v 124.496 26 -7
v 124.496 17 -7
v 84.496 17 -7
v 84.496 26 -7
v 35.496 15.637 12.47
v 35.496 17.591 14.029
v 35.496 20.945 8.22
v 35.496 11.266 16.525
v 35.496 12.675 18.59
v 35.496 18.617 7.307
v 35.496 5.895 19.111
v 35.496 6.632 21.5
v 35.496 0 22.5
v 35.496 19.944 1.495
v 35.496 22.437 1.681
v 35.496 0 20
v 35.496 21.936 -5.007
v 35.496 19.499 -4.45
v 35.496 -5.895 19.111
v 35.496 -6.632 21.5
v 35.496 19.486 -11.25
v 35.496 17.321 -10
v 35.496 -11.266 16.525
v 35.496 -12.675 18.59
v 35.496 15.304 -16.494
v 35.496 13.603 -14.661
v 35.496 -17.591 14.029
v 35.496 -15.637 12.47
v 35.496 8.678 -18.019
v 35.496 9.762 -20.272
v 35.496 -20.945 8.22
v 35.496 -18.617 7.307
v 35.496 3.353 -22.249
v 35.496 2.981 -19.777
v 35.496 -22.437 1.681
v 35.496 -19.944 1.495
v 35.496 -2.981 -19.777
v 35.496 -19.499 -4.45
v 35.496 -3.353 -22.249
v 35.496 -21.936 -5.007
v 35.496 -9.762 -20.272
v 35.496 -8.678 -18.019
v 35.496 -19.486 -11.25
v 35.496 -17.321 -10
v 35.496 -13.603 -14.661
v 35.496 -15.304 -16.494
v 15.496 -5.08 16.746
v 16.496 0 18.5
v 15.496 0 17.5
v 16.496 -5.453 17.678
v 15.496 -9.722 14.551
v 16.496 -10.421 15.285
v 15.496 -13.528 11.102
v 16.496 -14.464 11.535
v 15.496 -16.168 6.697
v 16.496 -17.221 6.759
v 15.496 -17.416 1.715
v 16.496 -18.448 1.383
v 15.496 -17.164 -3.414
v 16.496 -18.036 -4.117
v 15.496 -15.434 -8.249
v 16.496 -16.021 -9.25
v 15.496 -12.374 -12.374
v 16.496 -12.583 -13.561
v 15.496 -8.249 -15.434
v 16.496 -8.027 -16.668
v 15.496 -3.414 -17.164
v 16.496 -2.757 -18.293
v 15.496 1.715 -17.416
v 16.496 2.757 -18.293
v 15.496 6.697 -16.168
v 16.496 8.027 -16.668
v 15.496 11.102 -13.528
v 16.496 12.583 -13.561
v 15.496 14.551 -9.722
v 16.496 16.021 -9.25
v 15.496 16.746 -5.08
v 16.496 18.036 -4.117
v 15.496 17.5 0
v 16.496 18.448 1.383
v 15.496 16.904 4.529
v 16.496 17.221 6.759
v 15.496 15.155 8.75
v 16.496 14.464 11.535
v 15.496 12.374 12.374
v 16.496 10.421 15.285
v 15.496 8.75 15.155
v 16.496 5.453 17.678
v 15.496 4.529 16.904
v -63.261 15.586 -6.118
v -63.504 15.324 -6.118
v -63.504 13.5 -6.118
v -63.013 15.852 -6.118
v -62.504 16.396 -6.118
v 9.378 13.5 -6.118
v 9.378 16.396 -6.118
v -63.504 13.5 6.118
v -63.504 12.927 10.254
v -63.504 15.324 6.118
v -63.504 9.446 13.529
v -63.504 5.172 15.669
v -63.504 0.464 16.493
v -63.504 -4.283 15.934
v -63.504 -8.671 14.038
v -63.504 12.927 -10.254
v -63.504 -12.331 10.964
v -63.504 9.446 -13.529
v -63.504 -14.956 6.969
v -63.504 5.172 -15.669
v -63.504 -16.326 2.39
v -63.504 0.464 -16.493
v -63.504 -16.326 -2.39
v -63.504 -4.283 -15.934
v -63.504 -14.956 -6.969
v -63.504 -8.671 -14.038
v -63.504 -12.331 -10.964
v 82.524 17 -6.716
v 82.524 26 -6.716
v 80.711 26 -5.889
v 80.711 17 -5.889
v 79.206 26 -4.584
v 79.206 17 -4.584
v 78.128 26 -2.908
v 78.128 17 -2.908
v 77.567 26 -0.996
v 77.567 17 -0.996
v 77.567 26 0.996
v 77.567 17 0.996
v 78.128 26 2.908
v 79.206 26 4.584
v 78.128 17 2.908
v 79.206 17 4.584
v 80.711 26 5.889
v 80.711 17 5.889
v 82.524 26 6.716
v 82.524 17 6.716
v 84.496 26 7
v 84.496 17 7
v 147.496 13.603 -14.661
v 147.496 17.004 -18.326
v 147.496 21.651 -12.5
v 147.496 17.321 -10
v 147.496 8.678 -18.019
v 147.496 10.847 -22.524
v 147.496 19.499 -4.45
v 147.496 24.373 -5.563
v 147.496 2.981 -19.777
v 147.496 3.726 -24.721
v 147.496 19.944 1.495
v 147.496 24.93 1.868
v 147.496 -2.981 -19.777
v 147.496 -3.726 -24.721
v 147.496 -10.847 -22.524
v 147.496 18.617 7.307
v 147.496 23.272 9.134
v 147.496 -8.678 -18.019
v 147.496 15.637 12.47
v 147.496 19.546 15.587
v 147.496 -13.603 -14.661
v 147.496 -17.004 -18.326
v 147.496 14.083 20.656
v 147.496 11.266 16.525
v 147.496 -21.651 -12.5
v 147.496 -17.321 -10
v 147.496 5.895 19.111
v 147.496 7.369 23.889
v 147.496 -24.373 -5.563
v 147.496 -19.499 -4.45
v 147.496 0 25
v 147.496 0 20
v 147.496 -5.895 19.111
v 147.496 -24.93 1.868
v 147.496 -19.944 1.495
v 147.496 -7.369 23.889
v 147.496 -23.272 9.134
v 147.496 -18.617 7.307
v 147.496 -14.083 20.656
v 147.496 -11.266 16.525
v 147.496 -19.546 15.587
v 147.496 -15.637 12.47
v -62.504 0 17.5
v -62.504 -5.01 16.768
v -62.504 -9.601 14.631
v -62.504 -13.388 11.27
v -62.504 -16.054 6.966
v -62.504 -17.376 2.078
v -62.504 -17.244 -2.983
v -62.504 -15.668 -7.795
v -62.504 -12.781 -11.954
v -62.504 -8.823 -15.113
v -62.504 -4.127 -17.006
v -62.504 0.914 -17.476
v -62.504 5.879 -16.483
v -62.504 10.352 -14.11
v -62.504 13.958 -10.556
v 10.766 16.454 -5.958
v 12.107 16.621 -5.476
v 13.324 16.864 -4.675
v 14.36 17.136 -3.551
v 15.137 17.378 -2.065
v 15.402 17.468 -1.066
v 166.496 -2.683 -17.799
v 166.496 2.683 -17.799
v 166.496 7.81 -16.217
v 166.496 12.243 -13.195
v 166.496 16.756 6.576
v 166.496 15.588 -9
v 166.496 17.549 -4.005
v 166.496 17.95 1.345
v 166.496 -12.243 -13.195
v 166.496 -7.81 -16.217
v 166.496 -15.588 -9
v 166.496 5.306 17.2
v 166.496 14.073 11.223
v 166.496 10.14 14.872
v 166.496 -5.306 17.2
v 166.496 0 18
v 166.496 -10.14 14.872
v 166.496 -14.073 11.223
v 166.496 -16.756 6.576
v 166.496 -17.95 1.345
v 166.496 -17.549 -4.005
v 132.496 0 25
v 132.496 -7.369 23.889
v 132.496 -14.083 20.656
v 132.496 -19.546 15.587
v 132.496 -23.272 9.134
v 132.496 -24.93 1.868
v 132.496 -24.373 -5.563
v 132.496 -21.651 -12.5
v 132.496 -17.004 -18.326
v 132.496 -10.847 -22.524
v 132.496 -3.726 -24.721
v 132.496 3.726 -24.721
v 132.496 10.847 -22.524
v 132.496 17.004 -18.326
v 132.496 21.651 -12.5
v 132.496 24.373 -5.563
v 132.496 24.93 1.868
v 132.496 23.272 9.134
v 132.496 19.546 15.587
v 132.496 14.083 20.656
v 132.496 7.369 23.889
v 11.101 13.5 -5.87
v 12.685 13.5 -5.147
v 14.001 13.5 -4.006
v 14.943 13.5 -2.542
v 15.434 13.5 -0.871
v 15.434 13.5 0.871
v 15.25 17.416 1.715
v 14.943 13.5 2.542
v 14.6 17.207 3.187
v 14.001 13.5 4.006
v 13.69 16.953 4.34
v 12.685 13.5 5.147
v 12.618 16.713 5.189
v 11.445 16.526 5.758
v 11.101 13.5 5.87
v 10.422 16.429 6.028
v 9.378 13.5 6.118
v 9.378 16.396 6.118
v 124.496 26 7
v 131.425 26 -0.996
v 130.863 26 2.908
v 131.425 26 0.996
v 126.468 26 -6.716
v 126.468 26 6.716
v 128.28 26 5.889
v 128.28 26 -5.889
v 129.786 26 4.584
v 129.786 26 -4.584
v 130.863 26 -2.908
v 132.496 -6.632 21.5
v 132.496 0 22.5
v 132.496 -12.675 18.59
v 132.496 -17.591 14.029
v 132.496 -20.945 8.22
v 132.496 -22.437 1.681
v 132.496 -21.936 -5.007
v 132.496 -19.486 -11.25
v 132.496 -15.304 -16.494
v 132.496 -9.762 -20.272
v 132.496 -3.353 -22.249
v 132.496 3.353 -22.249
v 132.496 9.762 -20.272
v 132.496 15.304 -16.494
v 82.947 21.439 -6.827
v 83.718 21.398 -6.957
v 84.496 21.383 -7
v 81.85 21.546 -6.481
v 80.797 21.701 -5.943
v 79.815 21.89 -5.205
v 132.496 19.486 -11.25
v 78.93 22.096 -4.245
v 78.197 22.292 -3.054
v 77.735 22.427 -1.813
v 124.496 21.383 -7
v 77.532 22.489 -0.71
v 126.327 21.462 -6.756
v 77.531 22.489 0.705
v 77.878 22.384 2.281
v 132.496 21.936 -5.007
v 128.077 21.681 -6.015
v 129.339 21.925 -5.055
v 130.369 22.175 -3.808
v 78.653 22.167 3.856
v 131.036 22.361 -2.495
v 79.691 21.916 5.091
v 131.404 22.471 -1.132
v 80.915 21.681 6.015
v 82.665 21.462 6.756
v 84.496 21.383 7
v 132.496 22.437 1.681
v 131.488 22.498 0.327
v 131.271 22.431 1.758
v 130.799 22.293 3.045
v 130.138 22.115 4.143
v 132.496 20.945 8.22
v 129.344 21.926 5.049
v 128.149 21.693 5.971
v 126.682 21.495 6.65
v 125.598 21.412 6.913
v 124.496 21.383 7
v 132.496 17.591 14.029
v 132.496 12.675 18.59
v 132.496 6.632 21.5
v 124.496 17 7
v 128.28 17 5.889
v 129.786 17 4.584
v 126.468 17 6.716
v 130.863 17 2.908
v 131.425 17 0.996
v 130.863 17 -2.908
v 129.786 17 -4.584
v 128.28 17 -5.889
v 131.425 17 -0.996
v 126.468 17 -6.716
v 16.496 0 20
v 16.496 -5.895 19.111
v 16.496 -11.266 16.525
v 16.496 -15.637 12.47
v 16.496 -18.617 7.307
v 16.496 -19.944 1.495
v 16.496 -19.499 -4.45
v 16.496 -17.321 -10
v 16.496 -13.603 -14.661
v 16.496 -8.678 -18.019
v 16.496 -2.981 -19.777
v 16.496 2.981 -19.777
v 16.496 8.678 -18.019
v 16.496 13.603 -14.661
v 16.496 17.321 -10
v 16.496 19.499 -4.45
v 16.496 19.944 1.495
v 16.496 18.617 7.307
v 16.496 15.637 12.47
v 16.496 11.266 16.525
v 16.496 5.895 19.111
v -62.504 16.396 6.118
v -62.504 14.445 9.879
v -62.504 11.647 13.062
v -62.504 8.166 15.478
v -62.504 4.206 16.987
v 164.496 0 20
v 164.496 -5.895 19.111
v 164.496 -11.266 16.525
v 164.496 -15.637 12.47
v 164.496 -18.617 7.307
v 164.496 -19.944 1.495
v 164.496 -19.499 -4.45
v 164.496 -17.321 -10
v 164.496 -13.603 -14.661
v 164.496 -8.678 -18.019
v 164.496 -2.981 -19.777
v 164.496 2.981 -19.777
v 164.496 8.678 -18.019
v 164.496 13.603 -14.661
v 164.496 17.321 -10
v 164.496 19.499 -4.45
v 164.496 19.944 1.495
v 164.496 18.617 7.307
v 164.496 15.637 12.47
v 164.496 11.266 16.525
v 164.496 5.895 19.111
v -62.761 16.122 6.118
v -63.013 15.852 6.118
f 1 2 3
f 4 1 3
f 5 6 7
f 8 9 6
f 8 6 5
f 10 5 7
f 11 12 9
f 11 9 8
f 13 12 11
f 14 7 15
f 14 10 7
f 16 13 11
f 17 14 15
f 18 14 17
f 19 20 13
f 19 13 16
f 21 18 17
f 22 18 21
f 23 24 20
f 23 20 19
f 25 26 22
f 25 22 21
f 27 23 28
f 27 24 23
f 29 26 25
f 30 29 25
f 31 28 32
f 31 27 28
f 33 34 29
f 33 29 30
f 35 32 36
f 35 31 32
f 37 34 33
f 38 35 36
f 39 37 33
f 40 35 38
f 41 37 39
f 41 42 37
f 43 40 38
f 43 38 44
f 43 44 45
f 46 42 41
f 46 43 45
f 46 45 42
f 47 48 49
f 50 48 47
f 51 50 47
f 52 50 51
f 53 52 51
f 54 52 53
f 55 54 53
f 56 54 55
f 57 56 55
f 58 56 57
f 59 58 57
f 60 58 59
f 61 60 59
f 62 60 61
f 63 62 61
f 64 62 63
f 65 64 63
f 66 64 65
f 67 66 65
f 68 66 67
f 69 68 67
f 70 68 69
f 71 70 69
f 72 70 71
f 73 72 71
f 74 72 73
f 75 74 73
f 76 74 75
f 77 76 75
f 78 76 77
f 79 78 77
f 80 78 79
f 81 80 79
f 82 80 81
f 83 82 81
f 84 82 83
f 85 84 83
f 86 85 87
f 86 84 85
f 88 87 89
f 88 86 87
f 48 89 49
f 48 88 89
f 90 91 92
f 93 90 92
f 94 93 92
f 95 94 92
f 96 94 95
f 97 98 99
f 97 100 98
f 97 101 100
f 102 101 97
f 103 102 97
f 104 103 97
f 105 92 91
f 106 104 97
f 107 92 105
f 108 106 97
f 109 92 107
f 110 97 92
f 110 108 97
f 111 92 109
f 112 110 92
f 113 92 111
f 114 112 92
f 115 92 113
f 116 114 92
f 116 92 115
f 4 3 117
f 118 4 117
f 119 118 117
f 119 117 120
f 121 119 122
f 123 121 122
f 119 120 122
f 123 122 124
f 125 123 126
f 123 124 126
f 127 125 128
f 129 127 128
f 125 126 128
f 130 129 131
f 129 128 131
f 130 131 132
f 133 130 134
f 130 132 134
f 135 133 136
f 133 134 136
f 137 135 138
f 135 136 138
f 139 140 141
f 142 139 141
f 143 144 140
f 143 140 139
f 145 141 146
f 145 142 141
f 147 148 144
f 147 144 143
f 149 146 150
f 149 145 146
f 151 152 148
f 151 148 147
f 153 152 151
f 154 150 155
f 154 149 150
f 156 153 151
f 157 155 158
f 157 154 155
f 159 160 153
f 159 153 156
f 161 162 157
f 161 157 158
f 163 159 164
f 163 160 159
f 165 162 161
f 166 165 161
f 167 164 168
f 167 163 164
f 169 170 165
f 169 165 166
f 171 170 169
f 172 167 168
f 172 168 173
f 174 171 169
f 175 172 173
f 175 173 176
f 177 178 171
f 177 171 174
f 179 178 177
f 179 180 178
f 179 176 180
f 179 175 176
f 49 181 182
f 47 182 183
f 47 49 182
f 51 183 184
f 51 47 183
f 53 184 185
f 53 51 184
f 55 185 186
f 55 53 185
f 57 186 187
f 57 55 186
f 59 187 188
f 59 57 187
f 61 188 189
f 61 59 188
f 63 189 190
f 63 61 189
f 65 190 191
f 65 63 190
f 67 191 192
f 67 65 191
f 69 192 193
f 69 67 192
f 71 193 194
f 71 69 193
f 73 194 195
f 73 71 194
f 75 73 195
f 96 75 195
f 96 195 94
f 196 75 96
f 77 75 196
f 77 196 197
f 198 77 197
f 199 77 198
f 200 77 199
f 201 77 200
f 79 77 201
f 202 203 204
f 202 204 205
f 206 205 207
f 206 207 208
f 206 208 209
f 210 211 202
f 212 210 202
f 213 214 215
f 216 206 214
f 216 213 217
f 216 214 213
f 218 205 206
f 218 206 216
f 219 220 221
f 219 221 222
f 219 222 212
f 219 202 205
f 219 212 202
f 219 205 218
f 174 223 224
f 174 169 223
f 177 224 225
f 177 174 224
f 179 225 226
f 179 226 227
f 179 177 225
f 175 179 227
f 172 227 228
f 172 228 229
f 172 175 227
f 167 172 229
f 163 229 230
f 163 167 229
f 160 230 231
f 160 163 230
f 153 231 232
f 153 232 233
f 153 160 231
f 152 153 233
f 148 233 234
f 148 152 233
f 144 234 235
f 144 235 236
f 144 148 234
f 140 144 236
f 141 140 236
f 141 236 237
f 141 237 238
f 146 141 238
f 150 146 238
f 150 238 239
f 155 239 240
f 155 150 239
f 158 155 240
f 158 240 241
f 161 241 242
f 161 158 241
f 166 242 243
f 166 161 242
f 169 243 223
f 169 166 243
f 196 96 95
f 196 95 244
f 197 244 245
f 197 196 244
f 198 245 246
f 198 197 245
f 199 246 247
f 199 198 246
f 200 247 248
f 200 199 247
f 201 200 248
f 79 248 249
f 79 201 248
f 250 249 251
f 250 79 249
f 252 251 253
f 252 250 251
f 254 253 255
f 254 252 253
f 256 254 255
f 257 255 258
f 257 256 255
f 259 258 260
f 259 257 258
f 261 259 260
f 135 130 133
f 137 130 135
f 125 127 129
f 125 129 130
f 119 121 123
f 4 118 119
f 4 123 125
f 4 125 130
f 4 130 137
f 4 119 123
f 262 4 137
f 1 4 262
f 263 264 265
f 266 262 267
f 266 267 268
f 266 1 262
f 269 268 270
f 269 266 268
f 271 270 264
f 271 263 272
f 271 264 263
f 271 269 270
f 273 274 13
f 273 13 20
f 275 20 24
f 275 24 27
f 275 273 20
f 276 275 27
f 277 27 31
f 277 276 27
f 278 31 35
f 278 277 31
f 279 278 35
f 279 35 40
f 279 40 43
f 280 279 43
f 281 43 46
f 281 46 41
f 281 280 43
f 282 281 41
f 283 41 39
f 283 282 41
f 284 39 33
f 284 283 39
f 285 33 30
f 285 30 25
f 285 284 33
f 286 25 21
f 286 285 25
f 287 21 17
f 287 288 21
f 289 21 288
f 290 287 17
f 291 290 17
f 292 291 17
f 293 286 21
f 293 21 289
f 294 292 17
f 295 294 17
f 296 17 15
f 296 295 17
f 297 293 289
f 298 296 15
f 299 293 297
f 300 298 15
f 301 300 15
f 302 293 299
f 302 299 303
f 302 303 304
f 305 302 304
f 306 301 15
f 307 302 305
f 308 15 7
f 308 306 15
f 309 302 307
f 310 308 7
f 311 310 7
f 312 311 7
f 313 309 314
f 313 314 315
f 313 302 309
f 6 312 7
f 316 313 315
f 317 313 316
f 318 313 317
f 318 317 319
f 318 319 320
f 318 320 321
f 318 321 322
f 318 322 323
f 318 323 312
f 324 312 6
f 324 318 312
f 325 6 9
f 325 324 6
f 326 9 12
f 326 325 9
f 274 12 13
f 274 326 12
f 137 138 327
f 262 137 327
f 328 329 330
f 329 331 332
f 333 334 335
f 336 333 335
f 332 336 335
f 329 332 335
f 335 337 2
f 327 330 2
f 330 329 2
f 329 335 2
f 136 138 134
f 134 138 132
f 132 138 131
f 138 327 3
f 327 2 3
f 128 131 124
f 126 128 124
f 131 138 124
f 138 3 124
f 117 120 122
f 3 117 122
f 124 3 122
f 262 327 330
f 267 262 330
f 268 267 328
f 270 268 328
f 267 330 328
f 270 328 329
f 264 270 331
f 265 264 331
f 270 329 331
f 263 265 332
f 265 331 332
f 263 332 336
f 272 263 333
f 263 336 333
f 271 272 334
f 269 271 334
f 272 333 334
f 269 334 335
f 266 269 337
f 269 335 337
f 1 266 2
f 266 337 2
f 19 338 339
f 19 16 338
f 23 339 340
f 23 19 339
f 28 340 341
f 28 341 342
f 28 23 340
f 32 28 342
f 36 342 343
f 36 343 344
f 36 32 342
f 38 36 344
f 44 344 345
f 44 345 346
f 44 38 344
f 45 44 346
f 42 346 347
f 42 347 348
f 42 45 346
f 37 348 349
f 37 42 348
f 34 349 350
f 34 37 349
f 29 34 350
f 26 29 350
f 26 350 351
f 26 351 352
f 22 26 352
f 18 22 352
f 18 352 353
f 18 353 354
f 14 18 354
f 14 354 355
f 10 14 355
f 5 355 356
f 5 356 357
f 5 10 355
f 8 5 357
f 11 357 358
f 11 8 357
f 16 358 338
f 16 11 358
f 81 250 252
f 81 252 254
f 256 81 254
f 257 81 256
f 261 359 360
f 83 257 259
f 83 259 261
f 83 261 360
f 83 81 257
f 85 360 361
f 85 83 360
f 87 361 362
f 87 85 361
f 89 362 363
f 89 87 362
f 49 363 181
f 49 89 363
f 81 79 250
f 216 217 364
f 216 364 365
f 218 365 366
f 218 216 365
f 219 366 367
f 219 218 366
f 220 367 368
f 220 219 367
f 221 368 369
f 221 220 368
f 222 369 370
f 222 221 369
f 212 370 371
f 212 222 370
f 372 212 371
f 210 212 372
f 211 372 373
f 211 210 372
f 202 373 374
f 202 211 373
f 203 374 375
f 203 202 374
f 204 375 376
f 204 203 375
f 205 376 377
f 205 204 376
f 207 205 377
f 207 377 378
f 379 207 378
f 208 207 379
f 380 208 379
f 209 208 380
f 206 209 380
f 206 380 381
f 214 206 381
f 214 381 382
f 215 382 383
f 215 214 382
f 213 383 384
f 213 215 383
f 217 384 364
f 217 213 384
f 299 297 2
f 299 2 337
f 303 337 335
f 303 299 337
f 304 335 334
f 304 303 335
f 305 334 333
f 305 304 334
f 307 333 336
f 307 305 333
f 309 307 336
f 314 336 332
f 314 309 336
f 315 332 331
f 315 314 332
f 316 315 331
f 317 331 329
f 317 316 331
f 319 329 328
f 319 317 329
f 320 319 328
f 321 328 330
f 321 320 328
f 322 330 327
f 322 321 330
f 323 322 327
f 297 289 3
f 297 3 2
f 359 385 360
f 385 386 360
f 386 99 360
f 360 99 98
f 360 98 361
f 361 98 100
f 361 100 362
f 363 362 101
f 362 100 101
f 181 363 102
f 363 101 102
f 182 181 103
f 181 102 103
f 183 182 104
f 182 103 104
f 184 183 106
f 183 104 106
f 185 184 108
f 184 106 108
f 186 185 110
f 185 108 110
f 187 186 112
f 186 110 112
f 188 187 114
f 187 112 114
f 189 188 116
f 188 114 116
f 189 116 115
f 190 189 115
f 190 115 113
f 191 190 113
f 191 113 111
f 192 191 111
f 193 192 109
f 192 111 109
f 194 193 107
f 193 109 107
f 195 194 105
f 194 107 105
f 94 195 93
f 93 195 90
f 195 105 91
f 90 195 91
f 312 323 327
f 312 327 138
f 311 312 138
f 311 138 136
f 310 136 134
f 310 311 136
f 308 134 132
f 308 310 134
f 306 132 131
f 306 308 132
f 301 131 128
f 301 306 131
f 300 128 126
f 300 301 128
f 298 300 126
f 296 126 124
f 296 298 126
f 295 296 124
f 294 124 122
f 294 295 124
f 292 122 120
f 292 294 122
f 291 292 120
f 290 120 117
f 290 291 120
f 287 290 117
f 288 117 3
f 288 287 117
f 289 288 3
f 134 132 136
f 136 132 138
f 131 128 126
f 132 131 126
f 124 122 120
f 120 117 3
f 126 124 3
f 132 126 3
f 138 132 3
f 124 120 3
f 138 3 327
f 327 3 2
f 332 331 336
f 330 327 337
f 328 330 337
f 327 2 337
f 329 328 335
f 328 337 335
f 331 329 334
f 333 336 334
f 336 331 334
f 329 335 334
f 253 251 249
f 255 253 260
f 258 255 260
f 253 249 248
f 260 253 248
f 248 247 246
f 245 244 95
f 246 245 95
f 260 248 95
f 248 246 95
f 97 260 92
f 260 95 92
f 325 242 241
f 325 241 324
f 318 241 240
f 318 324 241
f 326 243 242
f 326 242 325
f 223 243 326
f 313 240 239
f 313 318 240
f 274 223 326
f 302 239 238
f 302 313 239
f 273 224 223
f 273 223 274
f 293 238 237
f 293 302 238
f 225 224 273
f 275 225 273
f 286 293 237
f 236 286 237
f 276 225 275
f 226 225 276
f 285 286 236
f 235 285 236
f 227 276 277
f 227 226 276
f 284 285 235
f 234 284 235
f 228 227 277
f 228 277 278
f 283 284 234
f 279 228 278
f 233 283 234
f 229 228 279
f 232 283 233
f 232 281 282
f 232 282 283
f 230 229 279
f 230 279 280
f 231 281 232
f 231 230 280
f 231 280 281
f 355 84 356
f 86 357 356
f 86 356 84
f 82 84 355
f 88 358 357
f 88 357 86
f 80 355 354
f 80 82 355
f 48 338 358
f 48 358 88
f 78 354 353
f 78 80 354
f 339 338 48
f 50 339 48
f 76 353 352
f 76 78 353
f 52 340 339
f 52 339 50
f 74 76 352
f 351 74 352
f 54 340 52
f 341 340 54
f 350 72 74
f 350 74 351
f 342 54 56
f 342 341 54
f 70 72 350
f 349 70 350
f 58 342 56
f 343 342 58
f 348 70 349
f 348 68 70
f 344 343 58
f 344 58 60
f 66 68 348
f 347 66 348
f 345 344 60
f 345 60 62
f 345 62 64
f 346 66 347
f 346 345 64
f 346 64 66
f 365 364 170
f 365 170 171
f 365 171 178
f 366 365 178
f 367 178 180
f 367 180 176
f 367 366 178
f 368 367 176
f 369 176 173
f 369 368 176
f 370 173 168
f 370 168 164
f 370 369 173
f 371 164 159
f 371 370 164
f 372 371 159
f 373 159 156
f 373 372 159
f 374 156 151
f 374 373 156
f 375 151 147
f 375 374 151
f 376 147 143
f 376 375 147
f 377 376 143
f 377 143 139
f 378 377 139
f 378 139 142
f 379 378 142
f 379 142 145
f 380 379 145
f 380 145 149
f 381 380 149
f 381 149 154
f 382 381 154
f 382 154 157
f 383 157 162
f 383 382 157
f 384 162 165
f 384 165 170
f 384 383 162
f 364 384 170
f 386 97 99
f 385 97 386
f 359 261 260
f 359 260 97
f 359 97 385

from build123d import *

# Parameters (mm, degrees)
CHAMFER1_SIZE       = 1
CHAMFER2_SIZE       = 1
CHAMFER3_SIZE       = 2
CUT_EXTRUDE1_START  = 17.5
CUT_EXTRUDE1_DEPTH  = 4
CUT_EXTRUDE2_START  = 22.5
CUT_EXTRUDE2_DEPTH  = 5.5
BOSS_EXTRUDE1_DEPTH = 9


with BuildPart() as part:
    # Sketch1 → Revolve1 (revolve)
    with BuildSketch(Plane.XY, mode=Mode.PRIVATE) as revolve1_sk:
        Polygon((-63.504203269, 0), (-63.504203269, 17.5), (16.495796731, 17.5), (16.495796731, 20), (35.495796731, 20), (35.495796731, 22.5), (132.495796731, 22.5), (132.495796731, 25), (147.495796731, 25), (147.495796731, 20), (166.495796731, 20), (166.495796731, 0), align=None)
    revolve(revolve1_sk.sketch.rotate(Axis((-82.320263497, 0, 0), (1, 0, 0)), 90), axis=Axis((-82.320263497, 0, 0), (1, 0, 0)))

    # Chamfer1
    chamfer1_edges = [part.edges().sort_by_distance(p)[0] for p in [
        (16.495796731, 0, -17.5),
    ]]
    chamfer(chamfer1_edges, length=CHAMFER1_SIZE)

    # Chamfer2
    chamfer2_edges = [part.edges().sort_by_distance(p)[0] for p in [
        (-63.504203269, 0, -17.5),
    ]]
    chamfer(chamfer2_edges, length=CHAMFER2_SIZE)

    # Chamfer3
    chamfer3_edges = [part.edges().sort_by_distance(p)[0] for p in [
        (166.495796731, 0, -20),
    ]]
    chamfer(chamfer3_edges, length=CHAMFER3_SIZE)

    # Sketch2 → Cut-Extrude1 (cut)
    with BuildSketch(Plane(origin=(0, 0, 0), x_dir=(1, 0, 0), z_dir=(0, 1, 0)).offset(CUT_EXTRUDE1_START)):
        with BuildLine():
            Line((-66.792748613, 6.118017394), (9.377779337, 6.118017394))
            ThreePointArc((9.377779337, 6.118017394), (15.495796731, 0), (9.377779337, -6.118017394))
            Line((9.377779337, -6.118017394), (-66.792748613, -6.118017394))
            ThreePointArc((-66.792748613, -6.118017394), (-72.910766007, 0), (-66.792748613, 6.118017394))
        make_face()
    extrude(amount=-CUT_EXTRUDE1_DEPTH, mode=Mode.SUBTRACT)

    # Sketch3 → Cut-Extrude2 (cut)
    with BuildSketch(Plane(origin=(0, 0, 0), x_dir=(1, 0, 0), z_dir=(0, 1, 0)).offset(CUT_EXTRUDE2_START)):
        with BuildLine():
            Line((84.495796731, 7), (124.495796731, 7))
            ThreePointArc((124.495796731, 7), (131.495796731, 0), (124.495796731, -7))
            Line((124.495796731, -7), (84.495796731, -7))
            ThreePointArc((84.495796731, -7), (77.495796731, 0), (84.495796731, 7))
        make_face()
    extrude(amount=-CUT_EXTRUDE2_DEPTH, mode=Mode.SUBTRACT)


with BuildPart() as body_2:
    # Sketch4 → Boss-Extrude1 (new body)
    with BuildSketch(Plane(origin=(0, 17, 0), x_dir=(1, 0, 0), z_dir=(0, 1, 0))):
        with BuildLine():
            Line((84.495796731, -7), (124.495796731, -7))
            ThreePointArc((124.495796731, -7), (131.495796731, 0), (124.495796731, 7))
            Line((124.495796731, 7), (84.495796731, 7))
            ThreePointArc((84.495796731, 7), (77.495796731, 0), (84.495796731, -7))
        make_face()
    extrude(amount=BOSS_EXTRUDE1_DEPTH)


solid = Compound([part.part, body_2.part])
